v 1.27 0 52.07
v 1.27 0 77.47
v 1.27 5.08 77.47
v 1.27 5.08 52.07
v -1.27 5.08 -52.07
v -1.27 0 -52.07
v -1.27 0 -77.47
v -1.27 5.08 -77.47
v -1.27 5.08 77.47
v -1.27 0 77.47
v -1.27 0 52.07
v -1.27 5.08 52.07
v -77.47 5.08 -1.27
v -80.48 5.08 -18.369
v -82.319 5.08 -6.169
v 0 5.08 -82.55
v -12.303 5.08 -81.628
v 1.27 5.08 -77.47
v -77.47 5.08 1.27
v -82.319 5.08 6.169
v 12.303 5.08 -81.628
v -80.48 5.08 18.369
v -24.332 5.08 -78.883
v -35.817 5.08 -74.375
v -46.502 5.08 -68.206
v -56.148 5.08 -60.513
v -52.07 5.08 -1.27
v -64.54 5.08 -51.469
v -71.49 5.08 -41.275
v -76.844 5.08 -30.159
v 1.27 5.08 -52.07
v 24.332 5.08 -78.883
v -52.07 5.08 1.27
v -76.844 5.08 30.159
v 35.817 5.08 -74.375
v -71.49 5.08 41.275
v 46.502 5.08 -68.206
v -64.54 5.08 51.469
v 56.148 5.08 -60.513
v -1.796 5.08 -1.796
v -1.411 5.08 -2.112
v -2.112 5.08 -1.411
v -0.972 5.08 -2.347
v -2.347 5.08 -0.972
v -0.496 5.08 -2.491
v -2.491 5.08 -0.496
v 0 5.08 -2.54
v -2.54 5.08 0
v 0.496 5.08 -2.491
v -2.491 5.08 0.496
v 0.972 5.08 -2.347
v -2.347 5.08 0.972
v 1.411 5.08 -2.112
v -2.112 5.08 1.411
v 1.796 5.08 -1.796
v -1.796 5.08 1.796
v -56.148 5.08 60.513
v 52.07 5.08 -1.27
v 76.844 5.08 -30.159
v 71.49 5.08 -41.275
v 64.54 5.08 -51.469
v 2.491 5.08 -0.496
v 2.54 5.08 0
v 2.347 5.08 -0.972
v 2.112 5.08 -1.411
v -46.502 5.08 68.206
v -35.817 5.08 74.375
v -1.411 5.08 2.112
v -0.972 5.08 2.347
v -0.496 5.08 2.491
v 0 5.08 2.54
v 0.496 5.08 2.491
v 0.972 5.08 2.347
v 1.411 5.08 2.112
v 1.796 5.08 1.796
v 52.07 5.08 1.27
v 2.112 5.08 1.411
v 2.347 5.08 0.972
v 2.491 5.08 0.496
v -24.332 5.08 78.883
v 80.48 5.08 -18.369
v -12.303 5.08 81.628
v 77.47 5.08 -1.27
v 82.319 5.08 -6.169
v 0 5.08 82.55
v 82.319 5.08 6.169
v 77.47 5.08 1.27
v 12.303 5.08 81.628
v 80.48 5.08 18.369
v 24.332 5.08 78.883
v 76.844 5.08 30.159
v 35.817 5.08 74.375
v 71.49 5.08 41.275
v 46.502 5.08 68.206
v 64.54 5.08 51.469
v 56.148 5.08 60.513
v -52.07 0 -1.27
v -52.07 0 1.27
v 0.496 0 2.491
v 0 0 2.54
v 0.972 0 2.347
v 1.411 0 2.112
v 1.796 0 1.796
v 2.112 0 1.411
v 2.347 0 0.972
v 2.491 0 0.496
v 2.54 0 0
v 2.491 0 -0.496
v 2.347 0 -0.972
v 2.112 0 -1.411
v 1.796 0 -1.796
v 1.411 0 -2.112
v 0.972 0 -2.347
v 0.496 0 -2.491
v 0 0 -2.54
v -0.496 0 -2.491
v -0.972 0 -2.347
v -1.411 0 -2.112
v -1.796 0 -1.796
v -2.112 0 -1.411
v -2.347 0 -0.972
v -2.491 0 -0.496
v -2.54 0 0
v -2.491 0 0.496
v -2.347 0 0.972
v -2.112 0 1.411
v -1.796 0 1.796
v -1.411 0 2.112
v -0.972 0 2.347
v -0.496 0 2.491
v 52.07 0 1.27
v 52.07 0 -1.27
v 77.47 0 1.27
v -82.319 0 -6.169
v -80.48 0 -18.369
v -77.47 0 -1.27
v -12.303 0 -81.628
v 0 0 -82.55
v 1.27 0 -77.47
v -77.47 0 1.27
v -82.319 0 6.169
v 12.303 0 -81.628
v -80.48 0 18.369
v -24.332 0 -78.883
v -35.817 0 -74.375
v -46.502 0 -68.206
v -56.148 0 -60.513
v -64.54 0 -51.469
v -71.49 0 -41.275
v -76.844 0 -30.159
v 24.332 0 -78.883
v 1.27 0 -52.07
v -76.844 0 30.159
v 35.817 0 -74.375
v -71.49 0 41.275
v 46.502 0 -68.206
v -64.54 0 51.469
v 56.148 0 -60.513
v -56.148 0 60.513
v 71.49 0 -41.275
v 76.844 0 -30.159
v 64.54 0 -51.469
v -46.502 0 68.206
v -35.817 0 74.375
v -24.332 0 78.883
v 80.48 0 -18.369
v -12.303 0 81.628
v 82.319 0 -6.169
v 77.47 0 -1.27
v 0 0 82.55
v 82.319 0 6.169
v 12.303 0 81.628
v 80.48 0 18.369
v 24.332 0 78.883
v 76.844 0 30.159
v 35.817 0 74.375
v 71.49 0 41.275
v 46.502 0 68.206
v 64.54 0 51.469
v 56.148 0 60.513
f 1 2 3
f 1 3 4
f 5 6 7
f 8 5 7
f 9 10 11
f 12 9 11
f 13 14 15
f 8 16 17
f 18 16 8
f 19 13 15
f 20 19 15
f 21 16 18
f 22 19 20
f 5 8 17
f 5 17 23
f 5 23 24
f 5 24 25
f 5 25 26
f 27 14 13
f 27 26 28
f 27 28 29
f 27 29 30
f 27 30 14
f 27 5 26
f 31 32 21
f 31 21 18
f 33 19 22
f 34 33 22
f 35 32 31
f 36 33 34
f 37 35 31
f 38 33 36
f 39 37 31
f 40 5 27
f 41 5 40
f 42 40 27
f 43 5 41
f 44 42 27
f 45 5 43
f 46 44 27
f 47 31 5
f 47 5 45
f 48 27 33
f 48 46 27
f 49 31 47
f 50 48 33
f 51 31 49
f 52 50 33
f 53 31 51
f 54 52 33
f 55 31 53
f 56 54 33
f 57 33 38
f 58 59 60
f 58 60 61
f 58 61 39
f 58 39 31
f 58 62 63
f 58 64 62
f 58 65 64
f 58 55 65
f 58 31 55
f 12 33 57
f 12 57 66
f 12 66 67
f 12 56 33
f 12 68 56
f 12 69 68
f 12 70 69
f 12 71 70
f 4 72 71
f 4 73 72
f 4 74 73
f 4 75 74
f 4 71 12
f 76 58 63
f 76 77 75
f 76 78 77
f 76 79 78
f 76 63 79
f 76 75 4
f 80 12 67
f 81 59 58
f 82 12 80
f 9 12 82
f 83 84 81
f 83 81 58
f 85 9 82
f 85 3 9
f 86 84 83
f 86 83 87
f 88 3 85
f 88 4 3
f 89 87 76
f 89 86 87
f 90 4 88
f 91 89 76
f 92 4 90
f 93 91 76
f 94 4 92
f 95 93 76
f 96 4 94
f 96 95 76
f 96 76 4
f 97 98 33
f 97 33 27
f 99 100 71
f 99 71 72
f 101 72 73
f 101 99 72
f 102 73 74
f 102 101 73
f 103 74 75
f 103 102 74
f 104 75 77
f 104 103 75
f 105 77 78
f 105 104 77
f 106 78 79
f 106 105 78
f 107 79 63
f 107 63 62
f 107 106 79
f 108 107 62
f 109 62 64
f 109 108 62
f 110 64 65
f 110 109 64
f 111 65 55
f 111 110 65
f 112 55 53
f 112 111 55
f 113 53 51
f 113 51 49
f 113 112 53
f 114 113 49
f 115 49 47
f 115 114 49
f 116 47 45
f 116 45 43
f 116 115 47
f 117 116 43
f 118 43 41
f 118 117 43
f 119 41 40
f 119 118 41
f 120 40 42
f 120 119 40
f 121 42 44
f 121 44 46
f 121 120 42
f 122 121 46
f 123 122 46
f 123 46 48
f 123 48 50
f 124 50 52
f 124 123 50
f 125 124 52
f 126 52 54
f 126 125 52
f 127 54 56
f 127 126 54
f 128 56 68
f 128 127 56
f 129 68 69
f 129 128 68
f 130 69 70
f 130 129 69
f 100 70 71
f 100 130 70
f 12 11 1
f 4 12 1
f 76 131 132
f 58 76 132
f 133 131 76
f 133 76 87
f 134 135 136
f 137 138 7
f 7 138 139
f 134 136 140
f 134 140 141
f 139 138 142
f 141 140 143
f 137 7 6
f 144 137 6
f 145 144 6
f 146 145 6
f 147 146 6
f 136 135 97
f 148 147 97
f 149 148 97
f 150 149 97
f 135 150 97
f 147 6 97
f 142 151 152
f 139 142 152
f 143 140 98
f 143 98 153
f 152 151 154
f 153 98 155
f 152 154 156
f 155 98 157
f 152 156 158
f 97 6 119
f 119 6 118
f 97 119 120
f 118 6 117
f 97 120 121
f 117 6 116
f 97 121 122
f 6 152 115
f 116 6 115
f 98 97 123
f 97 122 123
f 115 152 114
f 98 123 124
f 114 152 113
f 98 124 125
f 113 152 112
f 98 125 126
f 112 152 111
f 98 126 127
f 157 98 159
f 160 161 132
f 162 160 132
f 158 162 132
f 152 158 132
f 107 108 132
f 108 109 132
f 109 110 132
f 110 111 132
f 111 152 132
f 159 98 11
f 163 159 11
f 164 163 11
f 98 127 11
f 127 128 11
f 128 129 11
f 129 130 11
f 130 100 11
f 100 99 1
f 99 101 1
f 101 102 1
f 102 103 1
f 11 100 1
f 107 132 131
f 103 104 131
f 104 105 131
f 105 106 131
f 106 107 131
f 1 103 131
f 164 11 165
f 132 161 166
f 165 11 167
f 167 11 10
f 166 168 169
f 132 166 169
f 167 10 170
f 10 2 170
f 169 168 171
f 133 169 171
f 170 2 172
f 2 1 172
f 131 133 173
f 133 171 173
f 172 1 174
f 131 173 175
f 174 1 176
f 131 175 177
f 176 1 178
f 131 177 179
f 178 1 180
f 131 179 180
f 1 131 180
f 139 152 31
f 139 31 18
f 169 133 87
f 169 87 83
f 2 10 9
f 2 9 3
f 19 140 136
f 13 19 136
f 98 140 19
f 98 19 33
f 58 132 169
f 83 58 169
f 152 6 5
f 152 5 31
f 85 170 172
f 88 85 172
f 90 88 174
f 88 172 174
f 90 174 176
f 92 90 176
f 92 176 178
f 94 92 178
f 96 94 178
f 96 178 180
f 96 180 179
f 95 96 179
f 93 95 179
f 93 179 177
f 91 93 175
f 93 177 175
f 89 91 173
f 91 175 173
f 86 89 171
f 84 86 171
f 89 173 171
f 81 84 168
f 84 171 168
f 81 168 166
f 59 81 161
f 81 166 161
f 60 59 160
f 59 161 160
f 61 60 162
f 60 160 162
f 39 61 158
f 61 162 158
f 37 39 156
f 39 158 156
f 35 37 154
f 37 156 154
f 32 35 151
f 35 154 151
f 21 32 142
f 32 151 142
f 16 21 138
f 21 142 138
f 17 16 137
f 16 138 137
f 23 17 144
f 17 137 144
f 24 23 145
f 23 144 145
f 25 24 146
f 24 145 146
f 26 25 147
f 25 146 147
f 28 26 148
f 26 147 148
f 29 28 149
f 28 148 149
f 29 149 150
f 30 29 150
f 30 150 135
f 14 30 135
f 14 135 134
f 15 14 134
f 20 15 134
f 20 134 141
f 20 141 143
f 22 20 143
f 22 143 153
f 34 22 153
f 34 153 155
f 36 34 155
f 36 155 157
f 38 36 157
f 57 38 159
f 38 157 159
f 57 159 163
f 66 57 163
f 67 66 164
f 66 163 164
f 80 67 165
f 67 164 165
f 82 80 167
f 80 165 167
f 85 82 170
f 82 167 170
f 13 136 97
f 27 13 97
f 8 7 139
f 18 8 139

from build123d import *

# Parameters (mm, degrees)
SKETCH1_R           = 82.55
SKETCH1_R_2         = 2.54
SKETCH1_W           = 25.4
SKETCH1_H           = 2.54
SKETCH1_W_2         = 2.54
SKETCH1_H_2         = 25.4
BOSS_EXTRUDE1_DEPTH = 5.08


with BuildPart() as part:
    # Sketch1 → Boss-Extrude1 (new body)
    with BuildSketch(Plane(origin=(0, 0, 0), x_dir=(1, 0, 0), z_dir=(0, 1, 0))):
        with Locations(Location((0, 0, 0), (0, 0, 270))):
            Circle(SKETCH1_R)
        with Locations(Location((0, 0, 0), (0, 0, 270))):
            Circle(SKETCH1_R_2, mode=Mode.SUBTRACT)
        with Locations((64.77, 0)):
            Rectangle(SKETCH1_W, SKETCH1_H, mode=Mode.SUBTRACT)
        with Locations((0, 64.77)):
            Rectangle(SKETCH1_W_2, SKETCH1_H_2, mode=Mode.SUBTRACT)
        with Locations((0, -64.77)):
            Rectangle(SKETCH1_W_2, SKETCH1_H_2, mode=Mode.SUBTRACT)
        with Locations((-64.77, 0)):
            Rectangle(SKETCH1_W, SKETCH1_H, mode=Mode.SUBTRACT)
    extrude(amount=BOSS_EXTRUDE1_DEPTH)


solid = part.part
